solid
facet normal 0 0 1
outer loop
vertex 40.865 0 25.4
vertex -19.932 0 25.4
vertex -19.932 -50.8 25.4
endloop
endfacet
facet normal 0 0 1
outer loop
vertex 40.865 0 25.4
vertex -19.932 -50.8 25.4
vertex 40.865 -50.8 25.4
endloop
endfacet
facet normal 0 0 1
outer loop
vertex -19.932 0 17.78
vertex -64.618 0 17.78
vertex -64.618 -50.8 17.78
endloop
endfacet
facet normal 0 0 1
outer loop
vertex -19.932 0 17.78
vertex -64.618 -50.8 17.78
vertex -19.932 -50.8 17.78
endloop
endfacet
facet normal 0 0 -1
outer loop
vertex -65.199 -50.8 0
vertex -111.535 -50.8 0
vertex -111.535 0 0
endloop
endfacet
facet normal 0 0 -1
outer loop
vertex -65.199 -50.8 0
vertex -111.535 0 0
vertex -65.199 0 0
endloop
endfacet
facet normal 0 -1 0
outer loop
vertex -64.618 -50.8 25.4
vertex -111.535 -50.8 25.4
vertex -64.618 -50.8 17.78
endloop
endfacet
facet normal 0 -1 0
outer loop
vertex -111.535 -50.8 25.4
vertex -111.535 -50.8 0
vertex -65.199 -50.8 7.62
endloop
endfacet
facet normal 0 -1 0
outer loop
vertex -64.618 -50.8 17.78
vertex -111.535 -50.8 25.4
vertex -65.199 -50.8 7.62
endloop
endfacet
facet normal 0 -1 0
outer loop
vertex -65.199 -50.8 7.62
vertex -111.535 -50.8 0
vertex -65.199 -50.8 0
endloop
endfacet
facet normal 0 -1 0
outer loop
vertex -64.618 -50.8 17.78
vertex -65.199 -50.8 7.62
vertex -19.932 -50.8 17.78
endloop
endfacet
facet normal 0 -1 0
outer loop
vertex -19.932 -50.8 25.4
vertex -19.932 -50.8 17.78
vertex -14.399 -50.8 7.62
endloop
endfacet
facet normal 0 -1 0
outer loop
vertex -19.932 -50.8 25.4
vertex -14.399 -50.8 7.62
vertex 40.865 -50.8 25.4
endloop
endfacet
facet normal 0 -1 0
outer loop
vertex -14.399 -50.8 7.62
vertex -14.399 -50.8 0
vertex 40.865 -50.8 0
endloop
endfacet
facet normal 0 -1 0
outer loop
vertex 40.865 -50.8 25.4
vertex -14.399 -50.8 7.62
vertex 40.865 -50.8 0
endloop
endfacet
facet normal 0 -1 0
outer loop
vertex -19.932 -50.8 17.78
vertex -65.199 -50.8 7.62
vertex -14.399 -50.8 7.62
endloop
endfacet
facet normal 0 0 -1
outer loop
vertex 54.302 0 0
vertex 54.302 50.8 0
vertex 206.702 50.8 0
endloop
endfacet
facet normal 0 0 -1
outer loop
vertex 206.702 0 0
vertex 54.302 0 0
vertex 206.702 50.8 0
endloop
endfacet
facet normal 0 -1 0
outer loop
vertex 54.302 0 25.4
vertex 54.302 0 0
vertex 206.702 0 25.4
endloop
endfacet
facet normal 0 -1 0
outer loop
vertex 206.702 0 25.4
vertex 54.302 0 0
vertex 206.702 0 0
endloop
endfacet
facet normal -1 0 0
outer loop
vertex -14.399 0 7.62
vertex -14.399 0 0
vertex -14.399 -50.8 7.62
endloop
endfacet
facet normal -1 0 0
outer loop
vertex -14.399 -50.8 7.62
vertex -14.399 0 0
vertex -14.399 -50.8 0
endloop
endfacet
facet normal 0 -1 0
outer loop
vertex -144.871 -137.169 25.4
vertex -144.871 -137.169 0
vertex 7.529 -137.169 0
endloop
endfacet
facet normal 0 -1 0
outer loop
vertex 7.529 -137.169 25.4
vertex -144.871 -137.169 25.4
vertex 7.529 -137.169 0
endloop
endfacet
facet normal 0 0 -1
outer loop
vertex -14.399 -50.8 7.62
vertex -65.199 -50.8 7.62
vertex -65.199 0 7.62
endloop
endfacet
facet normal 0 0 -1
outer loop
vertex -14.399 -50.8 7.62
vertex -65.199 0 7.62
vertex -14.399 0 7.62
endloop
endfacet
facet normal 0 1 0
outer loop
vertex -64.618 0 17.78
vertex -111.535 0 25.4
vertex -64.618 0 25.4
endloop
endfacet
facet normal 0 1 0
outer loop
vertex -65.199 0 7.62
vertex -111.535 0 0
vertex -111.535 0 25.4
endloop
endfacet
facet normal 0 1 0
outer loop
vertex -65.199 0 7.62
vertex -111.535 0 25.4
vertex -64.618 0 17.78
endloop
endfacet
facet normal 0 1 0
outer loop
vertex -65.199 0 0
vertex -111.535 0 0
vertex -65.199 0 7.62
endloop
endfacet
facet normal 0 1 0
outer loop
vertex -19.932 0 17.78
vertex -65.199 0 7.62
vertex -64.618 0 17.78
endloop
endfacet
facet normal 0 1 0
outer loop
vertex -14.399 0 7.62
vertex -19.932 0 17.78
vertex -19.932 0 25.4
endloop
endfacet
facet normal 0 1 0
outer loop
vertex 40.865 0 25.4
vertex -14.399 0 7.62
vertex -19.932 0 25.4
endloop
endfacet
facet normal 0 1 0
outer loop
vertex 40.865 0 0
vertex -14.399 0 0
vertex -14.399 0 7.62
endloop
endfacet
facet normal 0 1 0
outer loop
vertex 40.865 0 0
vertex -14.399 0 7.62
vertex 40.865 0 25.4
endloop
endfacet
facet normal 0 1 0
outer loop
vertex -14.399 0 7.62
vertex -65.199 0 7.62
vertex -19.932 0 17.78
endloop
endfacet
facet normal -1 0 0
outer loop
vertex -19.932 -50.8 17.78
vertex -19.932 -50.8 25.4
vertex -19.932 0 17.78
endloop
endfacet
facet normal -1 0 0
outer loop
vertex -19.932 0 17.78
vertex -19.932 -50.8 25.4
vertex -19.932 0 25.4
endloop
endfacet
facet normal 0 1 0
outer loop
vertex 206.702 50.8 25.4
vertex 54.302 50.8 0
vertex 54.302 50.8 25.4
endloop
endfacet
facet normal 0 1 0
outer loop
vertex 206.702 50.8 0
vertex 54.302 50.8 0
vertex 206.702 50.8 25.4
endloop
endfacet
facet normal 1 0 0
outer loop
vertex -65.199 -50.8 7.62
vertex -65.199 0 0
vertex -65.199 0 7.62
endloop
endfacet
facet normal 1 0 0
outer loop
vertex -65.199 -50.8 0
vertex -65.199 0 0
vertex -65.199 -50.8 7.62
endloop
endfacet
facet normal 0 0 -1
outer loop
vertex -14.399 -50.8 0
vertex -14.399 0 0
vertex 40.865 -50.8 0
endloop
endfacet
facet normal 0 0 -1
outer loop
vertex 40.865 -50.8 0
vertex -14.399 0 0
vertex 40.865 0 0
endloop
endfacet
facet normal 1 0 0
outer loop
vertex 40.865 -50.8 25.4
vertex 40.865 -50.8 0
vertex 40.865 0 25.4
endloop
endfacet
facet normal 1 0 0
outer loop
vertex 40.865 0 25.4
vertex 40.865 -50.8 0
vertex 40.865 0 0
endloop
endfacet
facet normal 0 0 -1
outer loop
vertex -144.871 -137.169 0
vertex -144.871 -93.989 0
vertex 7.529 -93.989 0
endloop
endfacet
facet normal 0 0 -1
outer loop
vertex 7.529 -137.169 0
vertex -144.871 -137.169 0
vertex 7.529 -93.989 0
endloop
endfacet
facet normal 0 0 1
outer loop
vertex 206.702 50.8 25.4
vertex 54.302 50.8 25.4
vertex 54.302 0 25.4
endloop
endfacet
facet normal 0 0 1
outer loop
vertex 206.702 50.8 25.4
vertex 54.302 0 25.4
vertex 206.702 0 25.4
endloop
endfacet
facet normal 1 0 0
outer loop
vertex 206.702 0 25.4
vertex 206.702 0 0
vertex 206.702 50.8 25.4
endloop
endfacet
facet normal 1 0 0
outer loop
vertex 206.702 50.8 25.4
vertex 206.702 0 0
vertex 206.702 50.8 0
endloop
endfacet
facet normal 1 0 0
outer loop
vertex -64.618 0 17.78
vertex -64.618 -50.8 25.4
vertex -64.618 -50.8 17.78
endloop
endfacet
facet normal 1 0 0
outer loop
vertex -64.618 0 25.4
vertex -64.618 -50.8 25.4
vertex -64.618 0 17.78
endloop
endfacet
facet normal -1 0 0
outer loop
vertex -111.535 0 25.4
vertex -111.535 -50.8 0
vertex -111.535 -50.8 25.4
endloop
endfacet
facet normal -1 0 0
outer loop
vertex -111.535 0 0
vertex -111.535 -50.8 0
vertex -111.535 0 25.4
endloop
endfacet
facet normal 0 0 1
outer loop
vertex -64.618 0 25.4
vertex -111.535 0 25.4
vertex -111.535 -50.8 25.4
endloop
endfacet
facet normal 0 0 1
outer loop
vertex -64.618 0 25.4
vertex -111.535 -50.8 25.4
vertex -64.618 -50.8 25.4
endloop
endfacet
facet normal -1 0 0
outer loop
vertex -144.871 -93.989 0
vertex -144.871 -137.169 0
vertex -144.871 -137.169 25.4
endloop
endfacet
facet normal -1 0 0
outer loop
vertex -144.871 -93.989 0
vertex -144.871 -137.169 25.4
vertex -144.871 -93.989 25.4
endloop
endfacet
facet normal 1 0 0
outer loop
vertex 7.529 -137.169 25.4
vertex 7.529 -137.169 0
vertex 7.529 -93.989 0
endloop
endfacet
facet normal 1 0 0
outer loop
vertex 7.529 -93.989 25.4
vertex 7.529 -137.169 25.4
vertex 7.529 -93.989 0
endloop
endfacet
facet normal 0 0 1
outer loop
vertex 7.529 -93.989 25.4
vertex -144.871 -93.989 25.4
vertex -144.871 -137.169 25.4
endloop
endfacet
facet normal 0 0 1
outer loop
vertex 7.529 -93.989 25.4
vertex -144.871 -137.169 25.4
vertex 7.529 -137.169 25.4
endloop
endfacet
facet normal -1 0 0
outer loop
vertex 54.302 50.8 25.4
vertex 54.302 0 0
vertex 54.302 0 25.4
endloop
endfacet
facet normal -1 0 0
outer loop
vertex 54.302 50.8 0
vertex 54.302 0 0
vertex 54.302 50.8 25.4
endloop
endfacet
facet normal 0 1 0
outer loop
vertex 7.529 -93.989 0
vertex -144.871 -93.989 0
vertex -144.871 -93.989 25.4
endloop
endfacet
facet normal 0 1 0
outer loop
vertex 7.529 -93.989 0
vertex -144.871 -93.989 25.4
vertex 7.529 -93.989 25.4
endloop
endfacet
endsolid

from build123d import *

# Parameters (mm, degrees)
F0_W     = 152.4
F0_H     = 50.8
F1_DEPTH = 25.4
F2_W     = 44.685319
F2_H     = 50.8
F3_DEPTH = 7.62
F4_W     = 152.4
F4_H     = 43.18
F5_DEPTH = 25.4
F6_W     = 50.8
F6_H     = 50.8
F7_DEPTH = 7.62
F8_W     = 152.4
F8_H     = 50.8
F9_DEPTH = 25.4


with BuildPart() as f1:
    # F0 (on Top) → F1 (new body)
    with BuildSketch(Plane.XY):
        with Locations((-35.334655, -25.4)):
            Rectangle(F0_W, F0_H)
    extrude(amount=F1_DEPTH)

    # F2 (on face) → F3 (cut)
    with BuildSketch(Plane.XY.offset(25.4)):
        with Locations((-42.275101, -25.4)):
            Rectangle(F2_W, F2_H)
    extrude(amount=-F3_DEPTH, mode=Mode.SUBTRACT)

    # F6 (on face) → F7 (cut)
    with BuildSketch(Plane(origin=(0, 0, 0), x_dir=(1, 0, 0), z_dir=(0, 0, -1))):
        with Locations((-39.798928, 25.4)):
            Rectangle(F6_W, F6_H)
    extrude(amount=-F7_DEPTH, mode=Mode.SUBTRACT)


with BuildPart() as f5:
    # F4 (on Top) → F5 (new body)
    with BuildSketch(Plane.XY):
        with Locations((-68.671166, -115.578592)):
            Rectangle(F4_W, F4_H)
    extrude(amount=F5_DEPTH)


with BuildPart() as f9:
    # F8 (on Top) → F9 (new body)
    with BuildSketch(Plane.XY):
        with Locations((130.50212, 25.4)):
            Rectangle(F8_W, F8_H)
    extrude(amount=F9_DEPTH)


solid = Compound([f1.part, f5.part, f9.part])
